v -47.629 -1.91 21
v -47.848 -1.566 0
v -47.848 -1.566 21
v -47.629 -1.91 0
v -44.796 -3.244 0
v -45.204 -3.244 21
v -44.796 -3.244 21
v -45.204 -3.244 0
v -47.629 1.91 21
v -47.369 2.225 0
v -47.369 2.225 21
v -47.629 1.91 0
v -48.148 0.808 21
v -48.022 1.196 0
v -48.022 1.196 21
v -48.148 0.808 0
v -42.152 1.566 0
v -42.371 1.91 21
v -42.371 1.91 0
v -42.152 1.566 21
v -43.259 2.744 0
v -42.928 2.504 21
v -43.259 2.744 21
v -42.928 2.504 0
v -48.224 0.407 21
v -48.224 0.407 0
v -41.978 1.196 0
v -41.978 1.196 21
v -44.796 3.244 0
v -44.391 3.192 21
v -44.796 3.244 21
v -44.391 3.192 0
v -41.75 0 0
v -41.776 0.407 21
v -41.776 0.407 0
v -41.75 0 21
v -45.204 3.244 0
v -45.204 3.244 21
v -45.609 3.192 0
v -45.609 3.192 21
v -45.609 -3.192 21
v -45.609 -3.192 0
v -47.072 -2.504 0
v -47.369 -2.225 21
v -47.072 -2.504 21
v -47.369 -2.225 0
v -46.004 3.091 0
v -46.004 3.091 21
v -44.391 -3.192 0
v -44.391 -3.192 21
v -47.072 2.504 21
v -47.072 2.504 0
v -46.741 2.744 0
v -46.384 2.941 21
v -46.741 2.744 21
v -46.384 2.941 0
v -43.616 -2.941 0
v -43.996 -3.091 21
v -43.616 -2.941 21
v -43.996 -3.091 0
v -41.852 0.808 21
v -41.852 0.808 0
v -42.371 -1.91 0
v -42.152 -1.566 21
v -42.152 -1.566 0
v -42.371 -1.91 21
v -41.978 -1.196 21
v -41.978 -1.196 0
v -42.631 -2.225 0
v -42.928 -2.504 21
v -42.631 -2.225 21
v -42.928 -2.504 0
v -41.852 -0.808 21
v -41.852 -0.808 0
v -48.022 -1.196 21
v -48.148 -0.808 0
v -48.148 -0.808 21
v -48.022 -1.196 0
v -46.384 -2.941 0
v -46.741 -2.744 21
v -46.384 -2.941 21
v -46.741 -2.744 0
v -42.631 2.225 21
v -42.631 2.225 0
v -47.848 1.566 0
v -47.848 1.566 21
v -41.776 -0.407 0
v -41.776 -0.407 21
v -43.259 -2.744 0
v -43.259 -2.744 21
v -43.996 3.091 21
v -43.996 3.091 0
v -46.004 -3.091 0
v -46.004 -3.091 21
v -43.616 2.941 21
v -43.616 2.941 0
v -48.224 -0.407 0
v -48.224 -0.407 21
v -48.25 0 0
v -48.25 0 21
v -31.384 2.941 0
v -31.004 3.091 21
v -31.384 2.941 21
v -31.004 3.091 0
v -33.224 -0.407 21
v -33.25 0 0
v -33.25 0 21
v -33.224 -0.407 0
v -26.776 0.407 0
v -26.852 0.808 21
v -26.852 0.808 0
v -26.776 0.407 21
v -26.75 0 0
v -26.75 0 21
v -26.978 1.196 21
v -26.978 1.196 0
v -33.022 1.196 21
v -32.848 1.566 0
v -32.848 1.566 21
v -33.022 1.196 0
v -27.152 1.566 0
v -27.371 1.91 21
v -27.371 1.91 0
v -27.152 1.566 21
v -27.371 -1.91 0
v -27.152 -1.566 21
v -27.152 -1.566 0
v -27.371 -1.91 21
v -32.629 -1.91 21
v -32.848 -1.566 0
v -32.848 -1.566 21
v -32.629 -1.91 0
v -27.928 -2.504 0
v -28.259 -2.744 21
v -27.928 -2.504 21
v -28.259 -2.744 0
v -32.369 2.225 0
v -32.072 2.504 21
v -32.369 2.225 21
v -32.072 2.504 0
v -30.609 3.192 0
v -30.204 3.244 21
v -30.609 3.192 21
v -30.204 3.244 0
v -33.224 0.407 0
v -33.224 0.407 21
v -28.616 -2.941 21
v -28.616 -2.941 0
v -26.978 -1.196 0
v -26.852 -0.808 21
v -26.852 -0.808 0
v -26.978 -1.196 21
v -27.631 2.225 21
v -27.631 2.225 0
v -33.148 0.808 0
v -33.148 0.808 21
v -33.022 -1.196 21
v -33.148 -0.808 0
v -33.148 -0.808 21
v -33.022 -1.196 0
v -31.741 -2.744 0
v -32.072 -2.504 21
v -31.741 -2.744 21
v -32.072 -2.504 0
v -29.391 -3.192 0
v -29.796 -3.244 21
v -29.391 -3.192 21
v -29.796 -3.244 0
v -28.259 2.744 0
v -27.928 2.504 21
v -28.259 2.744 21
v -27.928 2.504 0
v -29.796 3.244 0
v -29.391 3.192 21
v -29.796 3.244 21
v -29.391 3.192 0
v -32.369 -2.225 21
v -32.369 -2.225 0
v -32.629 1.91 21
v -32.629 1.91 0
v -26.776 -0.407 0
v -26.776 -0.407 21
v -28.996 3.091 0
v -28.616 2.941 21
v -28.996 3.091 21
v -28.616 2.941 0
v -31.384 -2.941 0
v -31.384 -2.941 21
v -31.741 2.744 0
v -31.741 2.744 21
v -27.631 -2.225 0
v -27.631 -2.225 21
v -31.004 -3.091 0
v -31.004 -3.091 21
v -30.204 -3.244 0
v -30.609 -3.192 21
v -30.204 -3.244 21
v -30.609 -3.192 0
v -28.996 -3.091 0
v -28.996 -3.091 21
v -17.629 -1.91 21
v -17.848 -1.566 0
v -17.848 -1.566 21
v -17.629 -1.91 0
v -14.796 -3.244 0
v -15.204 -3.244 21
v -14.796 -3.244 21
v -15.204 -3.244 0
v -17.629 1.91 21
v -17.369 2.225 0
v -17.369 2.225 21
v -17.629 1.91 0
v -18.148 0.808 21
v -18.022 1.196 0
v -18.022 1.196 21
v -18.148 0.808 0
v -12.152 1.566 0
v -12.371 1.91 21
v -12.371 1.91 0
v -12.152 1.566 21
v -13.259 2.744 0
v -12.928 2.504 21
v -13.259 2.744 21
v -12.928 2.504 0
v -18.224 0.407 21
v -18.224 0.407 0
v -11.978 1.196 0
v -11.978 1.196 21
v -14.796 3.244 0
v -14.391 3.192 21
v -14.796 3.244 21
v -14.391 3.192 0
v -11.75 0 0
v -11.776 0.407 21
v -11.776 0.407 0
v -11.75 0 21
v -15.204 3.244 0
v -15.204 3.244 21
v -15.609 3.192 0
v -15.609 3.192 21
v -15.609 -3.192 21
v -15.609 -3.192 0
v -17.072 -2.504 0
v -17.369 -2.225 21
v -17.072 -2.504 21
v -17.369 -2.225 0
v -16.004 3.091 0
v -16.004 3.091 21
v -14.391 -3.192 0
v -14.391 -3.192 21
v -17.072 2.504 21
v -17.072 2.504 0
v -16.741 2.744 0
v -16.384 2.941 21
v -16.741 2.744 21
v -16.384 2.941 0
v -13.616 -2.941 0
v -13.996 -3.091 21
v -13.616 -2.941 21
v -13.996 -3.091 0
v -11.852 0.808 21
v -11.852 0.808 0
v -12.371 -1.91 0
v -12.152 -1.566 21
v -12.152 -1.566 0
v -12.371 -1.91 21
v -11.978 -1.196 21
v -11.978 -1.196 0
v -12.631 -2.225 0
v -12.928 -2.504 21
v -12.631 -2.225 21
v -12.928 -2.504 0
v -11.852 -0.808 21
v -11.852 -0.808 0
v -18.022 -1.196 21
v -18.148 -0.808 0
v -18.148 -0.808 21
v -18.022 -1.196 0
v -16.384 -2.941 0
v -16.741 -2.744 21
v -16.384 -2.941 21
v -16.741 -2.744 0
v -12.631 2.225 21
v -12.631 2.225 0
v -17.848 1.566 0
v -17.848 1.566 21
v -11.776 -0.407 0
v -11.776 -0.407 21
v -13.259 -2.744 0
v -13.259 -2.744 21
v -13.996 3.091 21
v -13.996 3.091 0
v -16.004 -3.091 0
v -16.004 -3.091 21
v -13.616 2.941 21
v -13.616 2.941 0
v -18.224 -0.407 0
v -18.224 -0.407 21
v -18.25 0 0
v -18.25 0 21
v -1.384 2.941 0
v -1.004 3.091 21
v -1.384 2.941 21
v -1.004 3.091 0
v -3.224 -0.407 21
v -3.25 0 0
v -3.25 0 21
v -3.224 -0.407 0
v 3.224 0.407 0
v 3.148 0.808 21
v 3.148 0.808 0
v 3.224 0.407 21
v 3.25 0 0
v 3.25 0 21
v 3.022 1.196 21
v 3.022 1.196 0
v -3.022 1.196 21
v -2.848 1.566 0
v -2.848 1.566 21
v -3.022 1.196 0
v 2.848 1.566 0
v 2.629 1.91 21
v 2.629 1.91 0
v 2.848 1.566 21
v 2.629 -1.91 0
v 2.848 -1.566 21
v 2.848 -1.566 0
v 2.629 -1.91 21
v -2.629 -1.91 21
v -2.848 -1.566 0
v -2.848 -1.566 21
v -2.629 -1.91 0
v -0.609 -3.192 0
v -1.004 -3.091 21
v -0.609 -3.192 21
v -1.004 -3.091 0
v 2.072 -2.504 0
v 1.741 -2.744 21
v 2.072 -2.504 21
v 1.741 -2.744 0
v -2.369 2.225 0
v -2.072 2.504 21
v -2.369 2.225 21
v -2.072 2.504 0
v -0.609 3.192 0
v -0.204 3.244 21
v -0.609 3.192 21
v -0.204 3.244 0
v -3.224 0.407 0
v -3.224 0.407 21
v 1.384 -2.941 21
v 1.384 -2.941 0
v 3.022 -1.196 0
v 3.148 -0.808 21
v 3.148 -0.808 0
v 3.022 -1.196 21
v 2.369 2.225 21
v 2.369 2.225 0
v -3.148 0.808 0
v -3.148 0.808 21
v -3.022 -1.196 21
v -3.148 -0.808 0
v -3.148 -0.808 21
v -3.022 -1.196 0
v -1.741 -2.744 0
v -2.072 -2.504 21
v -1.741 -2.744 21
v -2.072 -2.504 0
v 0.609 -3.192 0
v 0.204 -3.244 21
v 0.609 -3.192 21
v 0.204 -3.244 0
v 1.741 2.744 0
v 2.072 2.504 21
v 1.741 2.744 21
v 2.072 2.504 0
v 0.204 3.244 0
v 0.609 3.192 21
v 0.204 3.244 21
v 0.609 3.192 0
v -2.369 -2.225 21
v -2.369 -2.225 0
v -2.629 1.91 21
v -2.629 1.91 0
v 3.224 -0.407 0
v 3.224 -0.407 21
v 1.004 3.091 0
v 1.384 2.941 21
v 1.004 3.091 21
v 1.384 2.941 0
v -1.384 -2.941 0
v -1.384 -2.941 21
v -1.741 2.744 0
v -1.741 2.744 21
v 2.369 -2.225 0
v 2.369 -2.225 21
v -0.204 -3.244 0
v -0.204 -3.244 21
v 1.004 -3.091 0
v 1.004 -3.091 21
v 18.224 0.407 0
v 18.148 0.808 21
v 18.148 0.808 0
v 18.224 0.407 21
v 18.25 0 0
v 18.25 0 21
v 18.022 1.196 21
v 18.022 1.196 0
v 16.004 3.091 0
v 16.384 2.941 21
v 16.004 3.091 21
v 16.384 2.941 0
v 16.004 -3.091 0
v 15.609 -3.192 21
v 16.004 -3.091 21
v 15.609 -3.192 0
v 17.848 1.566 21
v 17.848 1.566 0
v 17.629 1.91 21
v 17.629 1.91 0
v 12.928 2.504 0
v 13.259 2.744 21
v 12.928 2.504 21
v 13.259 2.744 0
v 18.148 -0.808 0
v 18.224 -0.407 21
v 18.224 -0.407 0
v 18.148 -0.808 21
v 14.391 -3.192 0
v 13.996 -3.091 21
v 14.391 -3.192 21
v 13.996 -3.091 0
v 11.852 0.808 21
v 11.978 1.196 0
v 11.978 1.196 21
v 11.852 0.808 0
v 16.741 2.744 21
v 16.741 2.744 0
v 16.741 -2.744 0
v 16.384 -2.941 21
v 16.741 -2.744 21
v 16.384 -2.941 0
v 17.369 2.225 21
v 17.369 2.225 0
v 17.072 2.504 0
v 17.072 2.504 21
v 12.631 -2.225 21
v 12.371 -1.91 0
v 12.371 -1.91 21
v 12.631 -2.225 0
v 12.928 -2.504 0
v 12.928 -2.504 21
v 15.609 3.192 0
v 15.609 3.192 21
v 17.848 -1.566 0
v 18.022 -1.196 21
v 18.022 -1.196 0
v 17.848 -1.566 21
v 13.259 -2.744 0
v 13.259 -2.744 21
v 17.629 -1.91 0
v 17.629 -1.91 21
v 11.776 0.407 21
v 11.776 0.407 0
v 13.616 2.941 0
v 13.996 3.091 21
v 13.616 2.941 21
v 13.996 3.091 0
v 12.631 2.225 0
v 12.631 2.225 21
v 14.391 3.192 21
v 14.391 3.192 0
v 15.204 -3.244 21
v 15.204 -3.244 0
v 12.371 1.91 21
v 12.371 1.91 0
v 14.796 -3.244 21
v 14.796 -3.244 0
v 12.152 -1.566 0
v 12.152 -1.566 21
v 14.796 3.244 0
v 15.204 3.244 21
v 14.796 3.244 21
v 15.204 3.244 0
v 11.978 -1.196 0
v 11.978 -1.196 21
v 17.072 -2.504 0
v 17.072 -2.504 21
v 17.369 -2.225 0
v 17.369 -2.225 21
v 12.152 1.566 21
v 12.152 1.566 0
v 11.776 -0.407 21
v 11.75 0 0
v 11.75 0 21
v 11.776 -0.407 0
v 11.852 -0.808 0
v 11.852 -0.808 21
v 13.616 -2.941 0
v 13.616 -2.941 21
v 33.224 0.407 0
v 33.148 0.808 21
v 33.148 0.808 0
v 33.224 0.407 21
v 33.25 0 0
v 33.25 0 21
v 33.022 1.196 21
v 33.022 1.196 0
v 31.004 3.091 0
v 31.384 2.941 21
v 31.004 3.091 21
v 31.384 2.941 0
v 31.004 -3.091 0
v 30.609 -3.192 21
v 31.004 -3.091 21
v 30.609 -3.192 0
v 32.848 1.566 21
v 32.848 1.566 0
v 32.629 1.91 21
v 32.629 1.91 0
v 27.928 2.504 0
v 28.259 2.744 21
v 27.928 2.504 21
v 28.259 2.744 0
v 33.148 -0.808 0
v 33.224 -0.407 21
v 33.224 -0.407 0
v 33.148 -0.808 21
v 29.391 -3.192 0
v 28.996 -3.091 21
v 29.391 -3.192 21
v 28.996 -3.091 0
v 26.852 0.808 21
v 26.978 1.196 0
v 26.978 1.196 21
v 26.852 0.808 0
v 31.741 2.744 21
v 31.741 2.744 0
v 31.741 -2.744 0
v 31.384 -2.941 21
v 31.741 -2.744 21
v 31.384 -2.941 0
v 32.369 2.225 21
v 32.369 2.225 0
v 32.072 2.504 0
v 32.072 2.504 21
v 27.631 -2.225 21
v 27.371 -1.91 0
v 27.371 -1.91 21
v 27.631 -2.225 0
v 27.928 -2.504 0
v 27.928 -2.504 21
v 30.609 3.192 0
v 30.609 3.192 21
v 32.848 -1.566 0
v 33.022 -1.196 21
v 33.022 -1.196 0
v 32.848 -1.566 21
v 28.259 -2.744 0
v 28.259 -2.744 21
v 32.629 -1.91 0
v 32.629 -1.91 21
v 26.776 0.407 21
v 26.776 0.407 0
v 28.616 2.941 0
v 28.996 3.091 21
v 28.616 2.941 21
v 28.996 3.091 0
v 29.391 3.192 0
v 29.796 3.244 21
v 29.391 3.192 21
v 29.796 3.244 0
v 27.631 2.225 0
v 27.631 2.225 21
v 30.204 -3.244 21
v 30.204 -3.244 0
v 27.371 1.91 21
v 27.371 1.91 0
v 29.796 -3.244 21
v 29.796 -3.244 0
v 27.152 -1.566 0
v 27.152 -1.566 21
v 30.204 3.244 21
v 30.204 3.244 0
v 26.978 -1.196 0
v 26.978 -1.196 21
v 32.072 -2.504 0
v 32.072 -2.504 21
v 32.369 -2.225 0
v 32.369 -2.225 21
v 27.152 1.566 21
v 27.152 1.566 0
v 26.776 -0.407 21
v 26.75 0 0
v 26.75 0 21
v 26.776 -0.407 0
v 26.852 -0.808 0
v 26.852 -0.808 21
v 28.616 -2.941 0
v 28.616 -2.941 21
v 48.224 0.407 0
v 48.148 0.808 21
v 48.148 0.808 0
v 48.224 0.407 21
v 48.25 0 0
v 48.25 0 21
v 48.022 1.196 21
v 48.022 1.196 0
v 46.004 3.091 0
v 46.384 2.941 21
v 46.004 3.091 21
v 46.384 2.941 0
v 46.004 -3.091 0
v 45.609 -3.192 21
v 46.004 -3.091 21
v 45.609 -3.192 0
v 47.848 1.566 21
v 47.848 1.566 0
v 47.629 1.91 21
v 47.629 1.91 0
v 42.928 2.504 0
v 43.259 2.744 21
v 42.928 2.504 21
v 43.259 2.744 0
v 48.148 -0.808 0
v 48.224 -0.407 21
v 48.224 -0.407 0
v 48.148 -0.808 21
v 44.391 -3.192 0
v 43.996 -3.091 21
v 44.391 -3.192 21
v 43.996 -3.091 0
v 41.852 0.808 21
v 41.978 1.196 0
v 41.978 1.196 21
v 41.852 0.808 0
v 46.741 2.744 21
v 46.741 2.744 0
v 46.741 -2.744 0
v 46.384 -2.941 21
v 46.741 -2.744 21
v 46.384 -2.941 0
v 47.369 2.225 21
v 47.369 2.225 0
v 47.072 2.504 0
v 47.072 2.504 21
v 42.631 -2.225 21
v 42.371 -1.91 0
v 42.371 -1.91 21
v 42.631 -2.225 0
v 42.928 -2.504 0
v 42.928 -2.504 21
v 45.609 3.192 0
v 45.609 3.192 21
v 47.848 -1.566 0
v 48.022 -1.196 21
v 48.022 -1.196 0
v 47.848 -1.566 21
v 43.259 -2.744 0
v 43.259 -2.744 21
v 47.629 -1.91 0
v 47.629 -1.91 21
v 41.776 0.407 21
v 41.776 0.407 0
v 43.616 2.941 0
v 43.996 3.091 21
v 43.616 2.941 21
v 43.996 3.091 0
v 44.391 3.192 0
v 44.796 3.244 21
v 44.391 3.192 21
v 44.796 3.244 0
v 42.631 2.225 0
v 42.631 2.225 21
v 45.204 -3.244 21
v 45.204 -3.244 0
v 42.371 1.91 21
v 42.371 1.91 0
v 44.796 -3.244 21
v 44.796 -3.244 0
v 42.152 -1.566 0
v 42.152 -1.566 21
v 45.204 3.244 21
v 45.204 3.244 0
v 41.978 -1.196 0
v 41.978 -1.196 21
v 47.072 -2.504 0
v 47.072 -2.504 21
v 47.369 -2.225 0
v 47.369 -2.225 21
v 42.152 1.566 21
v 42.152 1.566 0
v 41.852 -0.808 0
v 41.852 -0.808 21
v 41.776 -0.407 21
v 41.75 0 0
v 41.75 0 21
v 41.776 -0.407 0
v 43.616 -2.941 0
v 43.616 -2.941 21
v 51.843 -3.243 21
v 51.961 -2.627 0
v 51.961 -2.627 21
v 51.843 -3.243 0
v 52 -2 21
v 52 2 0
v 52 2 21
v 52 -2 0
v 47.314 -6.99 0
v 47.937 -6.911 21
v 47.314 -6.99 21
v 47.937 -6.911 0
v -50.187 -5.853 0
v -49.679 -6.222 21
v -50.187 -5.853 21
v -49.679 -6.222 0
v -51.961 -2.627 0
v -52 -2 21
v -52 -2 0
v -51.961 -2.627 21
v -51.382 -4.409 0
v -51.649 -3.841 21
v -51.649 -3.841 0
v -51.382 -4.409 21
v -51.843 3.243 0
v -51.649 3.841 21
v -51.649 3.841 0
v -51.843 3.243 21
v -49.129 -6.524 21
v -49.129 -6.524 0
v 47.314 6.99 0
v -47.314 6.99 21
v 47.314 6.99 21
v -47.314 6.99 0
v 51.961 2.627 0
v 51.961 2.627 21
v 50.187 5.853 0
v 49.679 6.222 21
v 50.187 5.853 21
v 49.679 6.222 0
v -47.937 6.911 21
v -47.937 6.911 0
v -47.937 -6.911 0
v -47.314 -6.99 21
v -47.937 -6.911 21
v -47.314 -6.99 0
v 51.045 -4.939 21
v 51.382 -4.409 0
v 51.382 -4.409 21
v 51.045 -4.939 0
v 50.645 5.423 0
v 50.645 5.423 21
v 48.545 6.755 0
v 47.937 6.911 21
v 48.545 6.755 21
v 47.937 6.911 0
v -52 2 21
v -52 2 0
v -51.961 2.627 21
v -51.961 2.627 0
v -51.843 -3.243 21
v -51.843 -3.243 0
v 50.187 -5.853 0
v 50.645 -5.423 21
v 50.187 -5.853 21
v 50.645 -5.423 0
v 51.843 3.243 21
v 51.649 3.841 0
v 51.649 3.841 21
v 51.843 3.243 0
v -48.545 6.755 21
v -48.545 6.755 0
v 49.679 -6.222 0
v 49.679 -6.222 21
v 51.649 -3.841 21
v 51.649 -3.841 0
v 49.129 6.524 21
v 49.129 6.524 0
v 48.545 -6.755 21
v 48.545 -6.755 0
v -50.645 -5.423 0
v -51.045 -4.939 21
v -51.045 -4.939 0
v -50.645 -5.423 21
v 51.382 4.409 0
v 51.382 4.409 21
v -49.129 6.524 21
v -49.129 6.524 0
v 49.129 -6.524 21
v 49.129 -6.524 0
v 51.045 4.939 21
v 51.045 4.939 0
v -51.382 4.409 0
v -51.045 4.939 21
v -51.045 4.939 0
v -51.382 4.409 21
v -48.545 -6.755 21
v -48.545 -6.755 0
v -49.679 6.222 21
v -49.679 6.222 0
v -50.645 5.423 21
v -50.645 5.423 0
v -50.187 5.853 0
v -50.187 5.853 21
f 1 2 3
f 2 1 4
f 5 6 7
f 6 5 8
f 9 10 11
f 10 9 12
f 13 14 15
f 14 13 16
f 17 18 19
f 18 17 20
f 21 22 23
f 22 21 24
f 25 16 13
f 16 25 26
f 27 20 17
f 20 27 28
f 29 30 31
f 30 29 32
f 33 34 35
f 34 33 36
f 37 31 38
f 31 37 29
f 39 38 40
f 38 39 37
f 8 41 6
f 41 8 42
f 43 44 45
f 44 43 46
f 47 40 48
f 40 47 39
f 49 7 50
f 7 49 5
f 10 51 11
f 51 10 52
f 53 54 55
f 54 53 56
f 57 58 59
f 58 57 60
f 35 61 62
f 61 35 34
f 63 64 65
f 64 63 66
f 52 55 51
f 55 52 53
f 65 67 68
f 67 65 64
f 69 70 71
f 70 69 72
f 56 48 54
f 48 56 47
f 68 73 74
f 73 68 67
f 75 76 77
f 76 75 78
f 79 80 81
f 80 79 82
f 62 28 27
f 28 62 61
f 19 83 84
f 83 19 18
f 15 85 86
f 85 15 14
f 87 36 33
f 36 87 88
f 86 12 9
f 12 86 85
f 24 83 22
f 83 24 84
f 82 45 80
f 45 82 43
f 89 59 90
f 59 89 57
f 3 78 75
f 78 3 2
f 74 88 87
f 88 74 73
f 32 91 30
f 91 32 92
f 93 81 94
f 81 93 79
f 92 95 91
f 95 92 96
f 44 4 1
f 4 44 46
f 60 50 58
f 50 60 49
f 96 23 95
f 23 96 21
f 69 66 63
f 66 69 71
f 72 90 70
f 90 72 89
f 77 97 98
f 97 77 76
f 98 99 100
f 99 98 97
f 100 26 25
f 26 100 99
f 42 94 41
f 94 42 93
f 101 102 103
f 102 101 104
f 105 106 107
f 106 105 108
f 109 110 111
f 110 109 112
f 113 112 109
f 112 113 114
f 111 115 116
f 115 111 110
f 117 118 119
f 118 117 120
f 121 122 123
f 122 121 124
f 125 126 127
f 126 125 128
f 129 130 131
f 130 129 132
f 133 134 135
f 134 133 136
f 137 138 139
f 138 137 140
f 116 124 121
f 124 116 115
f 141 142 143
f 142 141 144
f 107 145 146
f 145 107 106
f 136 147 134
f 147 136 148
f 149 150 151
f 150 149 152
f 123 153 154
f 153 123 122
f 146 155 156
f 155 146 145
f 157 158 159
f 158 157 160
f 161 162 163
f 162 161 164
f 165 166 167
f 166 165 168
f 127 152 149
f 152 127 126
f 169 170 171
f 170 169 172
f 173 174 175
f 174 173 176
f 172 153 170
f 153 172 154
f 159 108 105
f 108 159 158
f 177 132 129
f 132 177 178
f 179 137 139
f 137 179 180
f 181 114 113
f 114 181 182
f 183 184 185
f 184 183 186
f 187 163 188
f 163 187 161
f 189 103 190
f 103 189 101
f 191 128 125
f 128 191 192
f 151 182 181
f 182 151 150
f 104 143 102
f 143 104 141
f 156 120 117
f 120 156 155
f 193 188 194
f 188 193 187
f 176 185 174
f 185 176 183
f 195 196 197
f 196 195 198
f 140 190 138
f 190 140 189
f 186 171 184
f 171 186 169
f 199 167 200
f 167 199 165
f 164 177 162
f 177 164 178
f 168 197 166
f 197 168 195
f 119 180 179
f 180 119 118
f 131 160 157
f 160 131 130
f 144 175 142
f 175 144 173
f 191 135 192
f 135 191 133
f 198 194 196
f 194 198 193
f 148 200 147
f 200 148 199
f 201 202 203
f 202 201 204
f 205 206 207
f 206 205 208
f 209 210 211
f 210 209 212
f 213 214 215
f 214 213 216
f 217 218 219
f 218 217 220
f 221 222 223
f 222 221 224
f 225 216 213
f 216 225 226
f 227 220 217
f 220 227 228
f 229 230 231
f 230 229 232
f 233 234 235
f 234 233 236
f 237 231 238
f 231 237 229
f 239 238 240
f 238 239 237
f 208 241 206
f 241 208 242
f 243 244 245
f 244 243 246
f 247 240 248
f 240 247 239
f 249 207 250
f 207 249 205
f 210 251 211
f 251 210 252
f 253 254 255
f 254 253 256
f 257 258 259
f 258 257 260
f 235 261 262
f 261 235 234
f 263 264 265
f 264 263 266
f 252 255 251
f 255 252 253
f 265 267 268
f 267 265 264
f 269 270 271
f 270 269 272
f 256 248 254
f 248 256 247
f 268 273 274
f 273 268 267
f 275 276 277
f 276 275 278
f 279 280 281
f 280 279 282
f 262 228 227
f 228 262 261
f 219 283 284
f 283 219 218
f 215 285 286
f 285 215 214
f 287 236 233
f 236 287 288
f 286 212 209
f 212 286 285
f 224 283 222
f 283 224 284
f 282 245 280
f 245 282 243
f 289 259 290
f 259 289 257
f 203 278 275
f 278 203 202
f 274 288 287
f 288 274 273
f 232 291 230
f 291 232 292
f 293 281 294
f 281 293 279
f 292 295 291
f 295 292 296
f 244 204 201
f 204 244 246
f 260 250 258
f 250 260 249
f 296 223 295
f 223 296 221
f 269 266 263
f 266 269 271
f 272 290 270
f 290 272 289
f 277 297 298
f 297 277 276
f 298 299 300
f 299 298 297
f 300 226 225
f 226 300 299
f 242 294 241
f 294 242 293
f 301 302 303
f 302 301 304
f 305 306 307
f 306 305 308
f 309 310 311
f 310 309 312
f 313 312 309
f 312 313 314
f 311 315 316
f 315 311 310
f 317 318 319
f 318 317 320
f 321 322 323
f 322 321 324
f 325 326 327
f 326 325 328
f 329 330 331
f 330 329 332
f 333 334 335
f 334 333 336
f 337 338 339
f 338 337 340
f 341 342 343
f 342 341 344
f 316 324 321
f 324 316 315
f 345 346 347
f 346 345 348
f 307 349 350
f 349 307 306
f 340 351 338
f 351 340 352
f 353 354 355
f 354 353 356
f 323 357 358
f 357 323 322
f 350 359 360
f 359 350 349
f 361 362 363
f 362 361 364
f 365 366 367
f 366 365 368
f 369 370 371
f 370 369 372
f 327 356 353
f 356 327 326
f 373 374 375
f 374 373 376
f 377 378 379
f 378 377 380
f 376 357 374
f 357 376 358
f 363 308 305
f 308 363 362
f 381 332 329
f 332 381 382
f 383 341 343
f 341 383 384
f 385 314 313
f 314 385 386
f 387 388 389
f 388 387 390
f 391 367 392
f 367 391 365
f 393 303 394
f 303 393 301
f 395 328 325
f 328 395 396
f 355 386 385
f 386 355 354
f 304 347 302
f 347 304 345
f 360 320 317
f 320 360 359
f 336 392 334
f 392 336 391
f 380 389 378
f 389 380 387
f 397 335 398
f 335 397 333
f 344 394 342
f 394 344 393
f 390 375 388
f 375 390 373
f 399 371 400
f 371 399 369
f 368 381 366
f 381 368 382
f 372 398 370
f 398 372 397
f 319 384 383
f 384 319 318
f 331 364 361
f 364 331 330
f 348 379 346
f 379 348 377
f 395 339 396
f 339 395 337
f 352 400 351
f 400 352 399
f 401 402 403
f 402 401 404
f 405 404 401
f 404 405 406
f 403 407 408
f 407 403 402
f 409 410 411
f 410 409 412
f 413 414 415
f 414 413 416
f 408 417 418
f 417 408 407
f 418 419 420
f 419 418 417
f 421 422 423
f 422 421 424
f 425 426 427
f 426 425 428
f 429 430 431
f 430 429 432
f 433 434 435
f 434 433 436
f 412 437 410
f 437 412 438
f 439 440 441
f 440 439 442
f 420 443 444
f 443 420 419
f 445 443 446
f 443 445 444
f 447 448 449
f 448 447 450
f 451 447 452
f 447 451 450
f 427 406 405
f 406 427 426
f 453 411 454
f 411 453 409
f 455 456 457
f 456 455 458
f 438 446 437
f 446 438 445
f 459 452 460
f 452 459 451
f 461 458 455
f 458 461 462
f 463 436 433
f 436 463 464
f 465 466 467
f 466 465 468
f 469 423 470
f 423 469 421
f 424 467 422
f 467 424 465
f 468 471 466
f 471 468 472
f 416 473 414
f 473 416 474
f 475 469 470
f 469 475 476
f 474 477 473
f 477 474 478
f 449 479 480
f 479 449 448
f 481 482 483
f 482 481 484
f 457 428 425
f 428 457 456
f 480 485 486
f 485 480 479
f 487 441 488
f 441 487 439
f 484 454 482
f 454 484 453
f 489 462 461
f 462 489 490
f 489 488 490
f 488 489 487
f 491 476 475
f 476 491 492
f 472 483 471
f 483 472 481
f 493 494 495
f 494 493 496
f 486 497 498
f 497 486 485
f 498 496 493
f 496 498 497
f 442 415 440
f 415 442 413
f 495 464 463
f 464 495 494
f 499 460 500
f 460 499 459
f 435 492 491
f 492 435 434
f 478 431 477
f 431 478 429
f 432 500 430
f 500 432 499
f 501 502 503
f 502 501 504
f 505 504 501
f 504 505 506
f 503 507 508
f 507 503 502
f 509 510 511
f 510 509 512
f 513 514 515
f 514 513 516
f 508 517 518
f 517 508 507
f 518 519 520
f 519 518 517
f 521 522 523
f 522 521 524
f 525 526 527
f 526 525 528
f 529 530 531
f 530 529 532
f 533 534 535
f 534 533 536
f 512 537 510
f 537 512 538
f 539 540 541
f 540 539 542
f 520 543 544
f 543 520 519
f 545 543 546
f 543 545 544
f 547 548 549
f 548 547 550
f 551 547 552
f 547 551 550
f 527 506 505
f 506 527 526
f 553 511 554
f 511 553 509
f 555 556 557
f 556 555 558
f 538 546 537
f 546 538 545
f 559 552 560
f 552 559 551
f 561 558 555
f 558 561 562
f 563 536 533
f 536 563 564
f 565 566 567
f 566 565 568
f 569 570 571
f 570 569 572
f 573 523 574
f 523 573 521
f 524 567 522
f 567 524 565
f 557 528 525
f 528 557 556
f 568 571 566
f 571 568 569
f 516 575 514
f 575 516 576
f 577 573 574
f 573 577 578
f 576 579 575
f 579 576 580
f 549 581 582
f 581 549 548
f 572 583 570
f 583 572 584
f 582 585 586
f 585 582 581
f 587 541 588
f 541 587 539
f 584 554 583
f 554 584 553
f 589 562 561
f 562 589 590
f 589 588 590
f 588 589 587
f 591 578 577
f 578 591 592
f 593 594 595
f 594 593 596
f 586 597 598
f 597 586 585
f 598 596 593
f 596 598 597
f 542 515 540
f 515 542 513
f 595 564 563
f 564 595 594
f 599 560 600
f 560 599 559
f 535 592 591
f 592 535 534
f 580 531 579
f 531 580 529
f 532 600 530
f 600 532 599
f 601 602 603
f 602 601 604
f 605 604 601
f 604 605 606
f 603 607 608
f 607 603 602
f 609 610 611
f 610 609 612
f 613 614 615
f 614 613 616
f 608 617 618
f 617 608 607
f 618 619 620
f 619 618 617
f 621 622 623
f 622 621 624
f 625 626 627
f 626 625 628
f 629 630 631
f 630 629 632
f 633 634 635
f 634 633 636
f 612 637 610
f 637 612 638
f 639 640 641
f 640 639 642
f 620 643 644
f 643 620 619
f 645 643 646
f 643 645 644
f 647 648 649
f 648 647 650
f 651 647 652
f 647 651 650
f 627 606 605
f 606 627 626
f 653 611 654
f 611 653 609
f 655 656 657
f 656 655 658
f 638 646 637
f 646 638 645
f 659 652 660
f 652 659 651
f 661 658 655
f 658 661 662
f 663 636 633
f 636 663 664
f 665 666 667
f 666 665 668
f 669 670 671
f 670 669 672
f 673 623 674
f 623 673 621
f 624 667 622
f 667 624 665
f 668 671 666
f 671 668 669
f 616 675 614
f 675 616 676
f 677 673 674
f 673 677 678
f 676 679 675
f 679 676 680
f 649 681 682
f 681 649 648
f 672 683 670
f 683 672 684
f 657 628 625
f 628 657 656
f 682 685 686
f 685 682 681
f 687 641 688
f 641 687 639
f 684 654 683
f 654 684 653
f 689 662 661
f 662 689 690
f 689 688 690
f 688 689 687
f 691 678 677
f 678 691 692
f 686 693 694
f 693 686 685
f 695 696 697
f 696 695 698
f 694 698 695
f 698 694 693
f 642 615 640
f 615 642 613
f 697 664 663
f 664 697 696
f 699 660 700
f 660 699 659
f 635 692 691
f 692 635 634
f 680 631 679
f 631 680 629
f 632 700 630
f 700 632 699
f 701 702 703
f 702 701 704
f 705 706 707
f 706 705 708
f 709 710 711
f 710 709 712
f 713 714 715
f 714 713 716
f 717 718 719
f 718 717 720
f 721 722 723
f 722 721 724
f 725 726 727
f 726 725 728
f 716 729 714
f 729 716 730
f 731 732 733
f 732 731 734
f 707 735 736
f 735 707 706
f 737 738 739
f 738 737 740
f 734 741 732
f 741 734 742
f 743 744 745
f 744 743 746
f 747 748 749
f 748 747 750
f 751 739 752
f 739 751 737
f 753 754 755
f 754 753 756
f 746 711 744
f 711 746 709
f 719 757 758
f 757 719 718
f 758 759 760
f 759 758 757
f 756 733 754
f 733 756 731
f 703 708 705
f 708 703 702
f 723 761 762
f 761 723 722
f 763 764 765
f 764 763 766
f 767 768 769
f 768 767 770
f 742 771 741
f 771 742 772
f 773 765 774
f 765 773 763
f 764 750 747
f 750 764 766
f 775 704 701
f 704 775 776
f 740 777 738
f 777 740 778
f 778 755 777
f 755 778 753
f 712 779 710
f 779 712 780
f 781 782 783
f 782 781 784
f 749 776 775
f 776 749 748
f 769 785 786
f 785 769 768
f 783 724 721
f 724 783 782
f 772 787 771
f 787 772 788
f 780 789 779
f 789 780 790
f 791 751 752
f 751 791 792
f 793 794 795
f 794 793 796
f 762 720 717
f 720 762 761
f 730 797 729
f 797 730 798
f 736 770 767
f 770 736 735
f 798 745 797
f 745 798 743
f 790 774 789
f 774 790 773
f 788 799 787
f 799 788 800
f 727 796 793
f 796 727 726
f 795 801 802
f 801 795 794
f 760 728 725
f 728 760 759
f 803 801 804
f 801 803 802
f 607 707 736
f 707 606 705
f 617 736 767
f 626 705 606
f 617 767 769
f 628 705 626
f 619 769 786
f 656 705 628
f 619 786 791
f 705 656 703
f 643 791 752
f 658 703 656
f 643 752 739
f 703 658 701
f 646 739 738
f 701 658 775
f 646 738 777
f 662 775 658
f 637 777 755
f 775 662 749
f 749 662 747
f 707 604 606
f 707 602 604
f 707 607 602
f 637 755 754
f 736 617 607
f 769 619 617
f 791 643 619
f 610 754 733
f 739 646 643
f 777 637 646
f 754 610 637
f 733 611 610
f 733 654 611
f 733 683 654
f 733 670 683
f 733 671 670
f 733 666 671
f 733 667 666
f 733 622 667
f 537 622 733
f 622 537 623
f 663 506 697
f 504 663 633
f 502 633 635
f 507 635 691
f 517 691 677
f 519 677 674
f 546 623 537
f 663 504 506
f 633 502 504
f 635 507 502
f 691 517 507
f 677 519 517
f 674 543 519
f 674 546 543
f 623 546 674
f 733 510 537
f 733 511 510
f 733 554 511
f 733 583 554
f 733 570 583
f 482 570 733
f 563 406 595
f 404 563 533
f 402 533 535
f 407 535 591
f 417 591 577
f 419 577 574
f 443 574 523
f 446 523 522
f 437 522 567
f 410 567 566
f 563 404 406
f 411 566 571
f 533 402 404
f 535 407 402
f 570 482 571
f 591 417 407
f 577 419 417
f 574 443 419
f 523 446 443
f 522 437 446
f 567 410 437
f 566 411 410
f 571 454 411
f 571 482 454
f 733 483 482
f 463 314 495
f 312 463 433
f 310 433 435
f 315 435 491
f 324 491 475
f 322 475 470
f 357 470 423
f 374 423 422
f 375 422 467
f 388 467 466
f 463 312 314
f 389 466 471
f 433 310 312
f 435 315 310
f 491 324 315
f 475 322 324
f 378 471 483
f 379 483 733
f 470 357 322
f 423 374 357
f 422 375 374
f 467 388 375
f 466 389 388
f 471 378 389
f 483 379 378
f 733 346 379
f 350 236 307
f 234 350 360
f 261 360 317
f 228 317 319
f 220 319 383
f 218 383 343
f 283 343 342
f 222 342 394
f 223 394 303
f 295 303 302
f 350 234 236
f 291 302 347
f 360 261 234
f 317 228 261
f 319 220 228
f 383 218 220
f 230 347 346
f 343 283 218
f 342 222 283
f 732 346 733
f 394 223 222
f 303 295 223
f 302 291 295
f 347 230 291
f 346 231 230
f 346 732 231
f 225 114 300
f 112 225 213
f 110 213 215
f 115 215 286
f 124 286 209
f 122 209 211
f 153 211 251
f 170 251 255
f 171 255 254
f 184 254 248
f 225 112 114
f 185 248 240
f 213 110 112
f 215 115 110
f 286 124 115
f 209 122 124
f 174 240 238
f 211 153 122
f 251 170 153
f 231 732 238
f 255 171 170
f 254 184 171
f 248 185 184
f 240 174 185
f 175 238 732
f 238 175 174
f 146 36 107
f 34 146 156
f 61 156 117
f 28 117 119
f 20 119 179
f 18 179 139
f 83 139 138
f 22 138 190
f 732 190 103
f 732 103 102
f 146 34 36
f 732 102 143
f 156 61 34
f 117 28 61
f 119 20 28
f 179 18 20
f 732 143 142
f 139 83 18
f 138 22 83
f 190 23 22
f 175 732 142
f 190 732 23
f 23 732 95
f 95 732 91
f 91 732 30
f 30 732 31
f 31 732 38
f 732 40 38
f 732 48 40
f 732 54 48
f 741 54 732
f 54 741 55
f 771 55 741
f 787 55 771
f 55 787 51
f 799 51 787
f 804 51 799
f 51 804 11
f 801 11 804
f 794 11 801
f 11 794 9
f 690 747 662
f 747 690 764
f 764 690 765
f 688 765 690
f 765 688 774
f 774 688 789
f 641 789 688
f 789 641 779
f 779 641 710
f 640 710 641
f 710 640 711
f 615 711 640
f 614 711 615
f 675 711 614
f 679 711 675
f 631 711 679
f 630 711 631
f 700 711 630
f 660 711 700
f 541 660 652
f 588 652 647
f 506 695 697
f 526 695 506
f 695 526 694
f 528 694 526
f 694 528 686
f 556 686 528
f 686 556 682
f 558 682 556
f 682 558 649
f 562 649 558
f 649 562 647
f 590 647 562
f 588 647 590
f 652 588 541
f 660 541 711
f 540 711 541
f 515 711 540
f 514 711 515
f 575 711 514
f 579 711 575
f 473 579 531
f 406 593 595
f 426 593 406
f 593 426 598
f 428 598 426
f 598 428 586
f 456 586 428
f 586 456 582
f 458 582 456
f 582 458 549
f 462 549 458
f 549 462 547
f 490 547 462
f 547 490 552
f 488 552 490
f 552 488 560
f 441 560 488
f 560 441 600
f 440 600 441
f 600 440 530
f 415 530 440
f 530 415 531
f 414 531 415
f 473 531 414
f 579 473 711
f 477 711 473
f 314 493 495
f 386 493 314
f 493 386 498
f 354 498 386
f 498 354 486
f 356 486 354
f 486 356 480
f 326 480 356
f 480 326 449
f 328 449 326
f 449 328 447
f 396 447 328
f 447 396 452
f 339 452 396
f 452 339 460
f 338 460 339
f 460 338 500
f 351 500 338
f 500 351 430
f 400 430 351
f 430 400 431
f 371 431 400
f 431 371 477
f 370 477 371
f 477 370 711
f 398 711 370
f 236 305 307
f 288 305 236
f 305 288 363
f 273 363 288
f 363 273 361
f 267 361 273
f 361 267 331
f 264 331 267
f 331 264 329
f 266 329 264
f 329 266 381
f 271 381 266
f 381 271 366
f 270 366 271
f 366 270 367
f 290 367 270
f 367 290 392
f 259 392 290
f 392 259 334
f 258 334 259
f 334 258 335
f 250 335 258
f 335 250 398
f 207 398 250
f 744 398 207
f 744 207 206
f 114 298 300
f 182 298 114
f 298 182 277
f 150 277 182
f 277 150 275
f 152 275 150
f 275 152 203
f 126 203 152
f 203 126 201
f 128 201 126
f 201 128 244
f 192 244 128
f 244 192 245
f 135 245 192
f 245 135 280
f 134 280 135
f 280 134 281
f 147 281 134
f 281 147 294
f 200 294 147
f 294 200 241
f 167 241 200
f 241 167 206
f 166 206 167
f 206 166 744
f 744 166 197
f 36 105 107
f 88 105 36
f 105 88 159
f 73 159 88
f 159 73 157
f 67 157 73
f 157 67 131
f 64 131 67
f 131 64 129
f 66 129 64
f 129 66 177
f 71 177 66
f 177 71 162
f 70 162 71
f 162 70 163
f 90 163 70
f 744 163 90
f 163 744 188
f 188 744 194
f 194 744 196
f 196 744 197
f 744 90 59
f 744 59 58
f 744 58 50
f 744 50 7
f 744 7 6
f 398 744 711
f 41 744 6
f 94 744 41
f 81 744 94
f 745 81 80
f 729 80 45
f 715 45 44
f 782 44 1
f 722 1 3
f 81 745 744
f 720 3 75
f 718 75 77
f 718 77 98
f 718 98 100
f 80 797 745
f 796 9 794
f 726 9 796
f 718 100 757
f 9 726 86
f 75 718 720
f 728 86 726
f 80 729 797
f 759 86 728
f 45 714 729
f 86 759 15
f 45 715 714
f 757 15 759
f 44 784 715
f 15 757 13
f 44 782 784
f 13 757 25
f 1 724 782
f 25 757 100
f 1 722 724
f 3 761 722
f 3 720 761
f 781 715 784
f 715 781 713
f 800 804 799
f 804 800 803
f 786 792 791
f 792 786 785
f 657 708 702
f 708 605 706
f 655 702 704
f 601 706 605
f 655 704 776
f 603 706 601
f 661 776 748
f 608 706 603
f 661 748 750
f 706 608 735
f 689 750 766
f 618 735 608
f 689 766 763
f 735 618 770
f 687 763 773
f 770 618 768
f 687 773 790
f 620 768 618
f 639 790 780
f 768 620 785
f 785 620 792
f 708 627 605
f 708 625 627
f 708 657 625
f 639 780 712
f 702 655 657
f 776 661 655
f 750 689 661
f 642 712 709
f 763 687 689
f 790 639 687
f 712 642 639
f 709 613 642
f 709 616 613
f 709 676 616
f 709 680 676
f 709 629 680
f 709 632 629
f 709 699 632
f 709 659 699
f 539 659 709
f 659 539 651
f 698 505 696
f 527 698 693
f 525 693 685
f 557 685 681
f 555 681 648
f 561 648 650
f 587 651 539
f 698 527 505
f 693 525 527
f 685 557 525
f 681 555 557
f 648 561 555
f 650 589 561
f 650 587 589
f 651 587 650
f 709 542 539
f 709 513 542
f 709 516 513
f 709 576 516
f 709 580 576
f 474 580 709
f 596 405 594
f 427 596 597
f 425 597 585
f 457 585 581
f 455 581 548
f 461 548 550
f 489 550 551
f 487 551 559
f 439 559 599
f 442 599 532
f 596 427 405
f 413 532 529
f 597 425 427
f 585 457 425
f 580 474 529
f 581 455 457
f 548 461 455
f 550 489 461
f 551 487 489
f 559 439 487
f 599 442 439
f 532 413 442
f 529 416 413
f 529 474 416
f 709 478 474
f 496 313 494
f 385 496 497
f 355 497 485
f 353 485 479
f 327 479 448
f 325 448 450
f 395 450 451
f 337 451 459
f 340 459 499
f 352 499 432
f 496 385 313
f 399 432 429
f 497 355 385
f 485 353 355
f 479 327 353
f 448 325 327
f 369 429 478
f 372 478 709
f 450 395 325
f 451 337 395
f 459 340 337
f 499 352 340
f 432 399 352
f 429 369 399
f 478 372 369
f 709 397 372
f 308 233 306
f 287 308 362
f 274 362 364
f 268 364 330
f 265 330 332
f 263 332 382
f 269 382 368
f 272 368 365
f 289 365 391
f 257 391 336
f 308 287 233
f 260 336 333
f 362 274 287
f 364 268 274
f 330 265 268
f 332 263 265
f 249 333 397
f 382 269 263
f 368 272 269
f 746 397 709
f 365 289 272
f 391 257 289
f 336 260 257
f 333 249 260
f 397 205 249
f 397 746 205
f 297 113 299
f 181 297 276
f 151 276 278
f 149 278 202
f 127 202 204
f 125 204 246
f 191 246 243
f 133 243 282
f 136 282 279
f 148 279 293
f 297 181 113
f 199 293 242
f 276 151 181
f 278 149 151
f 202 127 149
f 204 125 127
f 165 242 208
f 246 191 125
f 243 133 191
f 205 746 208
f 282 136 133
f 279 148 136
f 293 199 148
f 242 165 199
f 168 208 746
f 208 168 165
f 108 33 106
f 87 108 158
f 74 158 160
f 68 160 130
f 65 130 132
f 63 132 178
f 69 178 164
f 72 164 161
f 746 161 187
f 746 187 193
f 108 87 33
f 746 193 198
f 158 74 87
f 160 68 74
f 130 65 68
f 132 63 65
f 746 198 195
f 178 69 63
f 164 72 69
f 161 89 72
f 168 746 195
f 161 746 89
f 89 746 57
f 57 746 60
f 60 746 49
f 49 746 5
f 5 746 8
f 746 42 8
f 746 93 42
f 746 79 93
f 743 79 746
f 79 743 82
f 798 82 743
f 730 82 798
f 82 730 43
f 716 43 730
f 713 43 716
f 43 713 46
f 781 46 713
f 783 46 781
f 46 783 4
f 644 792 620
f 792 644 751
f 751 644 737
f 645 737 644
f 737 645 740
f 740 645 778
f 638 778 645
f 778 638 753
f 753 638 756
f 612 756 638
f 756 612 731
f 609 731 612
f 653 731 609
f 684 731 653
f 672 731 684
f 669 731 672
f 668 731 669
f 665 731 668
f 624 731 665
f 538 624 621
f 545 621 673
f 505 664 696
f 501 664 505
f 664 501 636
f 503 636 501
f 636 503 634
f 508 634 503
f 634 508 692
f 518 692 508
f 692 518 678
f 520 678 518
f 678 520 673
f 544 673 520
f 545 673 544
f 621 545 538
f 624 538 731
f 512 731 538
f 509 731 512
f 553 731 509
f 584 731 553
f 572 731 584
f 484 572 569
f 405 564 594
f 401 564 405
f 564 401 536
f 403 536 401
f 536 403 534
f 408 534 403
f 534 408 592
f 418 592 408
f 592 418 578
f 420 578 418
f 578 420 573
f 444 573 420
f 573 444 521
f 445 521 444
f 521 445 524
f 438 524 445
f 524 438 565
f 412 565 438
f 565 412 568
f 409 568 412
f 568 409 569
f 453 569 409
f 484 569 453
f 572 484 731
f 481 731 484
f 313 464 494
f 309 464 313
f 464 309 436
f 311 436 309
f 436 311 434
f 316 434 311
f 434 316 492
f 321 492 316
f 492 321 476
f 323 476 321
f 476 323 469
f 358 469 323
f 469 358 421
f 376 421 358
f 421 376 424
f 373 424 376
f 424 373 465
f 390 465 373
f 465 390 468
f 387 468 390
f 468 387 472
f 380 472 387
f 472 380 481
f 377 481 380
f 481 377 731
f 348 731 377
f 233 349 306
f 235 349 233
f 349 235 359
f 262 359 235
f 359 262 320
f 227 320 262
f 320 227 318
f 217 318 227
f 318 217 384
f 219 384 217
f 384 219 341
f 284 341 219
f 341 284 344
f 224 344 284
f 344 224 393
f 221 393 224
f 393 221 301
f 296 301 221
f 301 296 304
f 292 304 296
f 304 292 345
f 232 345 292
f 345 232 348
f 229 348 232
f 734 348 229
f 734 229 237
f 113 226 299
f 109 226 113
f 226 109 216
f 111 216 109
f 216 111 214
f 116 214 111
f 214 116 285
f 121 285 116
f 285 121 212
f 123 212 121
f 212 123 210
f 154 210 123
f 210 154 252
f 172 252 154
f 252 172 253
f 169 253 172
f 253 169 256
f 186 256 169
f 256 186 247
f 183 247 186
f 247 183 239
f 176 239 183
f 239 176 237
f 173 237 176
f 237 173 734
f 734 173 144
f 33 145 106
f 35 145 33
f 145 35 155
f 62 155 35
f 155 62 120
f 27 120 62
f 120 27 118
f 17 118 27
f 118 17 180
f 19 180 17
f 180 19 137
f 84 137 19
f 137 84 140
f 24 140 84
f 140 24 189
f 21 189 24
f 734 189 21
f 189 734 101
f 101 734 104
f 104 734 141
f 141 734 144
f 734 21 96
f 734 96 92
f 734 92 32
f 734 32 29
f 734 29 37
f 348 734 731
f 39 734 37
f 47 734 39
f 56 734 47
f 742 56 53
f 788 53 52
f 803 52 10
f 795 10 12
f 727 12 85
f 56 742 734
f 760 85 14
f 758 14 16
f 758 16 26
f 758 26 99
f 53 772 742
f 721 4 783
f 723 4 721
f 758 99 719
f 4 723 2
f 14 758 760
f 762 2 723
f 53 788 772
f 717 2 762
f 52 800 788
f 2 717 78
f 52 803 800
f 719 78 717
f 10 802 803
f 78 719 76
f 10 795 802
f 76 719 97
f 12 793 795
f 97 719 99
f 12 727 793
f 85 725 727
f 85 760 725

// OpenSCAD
$fn = 50;


difference() {
	union() {
		hull() {
			translate(v = [-47.0000000000, 2.0000000000, 0]) {
				cylinder(h = 21, r = 5);
			}
			translate(v = [47.0000000000, 2.0000000000, 0]) {
				cylinder(h = 21, r = 5);
			}
			translate(v = [-47.0000000000, -2.0000000000, 0]) {
				cylinder(h = 21, r = 5);
			}
			translate(v = [47.0000000000, -2.0000000000, 0]) {
				cylinder(h = 21, r = 5);
			}
		}
	}
	union() {
		translate(v = [-45.0000000000, 0.0000000000, 0]) {
			translate(v = [0, 0, -100]) {
				cylinder(h = 200, r = 3.2500000000);
			}
		}
		translate(v = [-30.0000000000, 0.0000000000, 0]) {
			translate(v = [0, 0, -100]) {
				cylinder(h = 200, r = 3.2500000000);
			}
		}
		translate(v = [-15.0000000000, 0.0000000000, 0]) {
			translate(v = [0, 0, -100]) {
				cylinder(h = 200, r = 3.2500000000);
			}
		}
		translate(v = [0, 0, -100]) {
			cylinder(h = 200, r = 3.2500000000);
		}
		translate(v = [15.0000000000, 0.0000000000, 0]) {
			translate(v = [0, 0, -100]) {
				cylinder(h = 200, r = 3.2500000000);
			}
		}
		translate(v = [30.0000000000, 0.0000000000, 0]) {
			translate(v = [0, 0, -100]) {
				cylinder(h = 200, r = 3.2500000000);
			}
		}
		translate(v = [45.0000000000, 0.0000000000, 0]) {
			translate(v = [0, 0, -100]) {
				cylinder(h = 200, r = 3.2500000000);
			}
		}
	}
}
